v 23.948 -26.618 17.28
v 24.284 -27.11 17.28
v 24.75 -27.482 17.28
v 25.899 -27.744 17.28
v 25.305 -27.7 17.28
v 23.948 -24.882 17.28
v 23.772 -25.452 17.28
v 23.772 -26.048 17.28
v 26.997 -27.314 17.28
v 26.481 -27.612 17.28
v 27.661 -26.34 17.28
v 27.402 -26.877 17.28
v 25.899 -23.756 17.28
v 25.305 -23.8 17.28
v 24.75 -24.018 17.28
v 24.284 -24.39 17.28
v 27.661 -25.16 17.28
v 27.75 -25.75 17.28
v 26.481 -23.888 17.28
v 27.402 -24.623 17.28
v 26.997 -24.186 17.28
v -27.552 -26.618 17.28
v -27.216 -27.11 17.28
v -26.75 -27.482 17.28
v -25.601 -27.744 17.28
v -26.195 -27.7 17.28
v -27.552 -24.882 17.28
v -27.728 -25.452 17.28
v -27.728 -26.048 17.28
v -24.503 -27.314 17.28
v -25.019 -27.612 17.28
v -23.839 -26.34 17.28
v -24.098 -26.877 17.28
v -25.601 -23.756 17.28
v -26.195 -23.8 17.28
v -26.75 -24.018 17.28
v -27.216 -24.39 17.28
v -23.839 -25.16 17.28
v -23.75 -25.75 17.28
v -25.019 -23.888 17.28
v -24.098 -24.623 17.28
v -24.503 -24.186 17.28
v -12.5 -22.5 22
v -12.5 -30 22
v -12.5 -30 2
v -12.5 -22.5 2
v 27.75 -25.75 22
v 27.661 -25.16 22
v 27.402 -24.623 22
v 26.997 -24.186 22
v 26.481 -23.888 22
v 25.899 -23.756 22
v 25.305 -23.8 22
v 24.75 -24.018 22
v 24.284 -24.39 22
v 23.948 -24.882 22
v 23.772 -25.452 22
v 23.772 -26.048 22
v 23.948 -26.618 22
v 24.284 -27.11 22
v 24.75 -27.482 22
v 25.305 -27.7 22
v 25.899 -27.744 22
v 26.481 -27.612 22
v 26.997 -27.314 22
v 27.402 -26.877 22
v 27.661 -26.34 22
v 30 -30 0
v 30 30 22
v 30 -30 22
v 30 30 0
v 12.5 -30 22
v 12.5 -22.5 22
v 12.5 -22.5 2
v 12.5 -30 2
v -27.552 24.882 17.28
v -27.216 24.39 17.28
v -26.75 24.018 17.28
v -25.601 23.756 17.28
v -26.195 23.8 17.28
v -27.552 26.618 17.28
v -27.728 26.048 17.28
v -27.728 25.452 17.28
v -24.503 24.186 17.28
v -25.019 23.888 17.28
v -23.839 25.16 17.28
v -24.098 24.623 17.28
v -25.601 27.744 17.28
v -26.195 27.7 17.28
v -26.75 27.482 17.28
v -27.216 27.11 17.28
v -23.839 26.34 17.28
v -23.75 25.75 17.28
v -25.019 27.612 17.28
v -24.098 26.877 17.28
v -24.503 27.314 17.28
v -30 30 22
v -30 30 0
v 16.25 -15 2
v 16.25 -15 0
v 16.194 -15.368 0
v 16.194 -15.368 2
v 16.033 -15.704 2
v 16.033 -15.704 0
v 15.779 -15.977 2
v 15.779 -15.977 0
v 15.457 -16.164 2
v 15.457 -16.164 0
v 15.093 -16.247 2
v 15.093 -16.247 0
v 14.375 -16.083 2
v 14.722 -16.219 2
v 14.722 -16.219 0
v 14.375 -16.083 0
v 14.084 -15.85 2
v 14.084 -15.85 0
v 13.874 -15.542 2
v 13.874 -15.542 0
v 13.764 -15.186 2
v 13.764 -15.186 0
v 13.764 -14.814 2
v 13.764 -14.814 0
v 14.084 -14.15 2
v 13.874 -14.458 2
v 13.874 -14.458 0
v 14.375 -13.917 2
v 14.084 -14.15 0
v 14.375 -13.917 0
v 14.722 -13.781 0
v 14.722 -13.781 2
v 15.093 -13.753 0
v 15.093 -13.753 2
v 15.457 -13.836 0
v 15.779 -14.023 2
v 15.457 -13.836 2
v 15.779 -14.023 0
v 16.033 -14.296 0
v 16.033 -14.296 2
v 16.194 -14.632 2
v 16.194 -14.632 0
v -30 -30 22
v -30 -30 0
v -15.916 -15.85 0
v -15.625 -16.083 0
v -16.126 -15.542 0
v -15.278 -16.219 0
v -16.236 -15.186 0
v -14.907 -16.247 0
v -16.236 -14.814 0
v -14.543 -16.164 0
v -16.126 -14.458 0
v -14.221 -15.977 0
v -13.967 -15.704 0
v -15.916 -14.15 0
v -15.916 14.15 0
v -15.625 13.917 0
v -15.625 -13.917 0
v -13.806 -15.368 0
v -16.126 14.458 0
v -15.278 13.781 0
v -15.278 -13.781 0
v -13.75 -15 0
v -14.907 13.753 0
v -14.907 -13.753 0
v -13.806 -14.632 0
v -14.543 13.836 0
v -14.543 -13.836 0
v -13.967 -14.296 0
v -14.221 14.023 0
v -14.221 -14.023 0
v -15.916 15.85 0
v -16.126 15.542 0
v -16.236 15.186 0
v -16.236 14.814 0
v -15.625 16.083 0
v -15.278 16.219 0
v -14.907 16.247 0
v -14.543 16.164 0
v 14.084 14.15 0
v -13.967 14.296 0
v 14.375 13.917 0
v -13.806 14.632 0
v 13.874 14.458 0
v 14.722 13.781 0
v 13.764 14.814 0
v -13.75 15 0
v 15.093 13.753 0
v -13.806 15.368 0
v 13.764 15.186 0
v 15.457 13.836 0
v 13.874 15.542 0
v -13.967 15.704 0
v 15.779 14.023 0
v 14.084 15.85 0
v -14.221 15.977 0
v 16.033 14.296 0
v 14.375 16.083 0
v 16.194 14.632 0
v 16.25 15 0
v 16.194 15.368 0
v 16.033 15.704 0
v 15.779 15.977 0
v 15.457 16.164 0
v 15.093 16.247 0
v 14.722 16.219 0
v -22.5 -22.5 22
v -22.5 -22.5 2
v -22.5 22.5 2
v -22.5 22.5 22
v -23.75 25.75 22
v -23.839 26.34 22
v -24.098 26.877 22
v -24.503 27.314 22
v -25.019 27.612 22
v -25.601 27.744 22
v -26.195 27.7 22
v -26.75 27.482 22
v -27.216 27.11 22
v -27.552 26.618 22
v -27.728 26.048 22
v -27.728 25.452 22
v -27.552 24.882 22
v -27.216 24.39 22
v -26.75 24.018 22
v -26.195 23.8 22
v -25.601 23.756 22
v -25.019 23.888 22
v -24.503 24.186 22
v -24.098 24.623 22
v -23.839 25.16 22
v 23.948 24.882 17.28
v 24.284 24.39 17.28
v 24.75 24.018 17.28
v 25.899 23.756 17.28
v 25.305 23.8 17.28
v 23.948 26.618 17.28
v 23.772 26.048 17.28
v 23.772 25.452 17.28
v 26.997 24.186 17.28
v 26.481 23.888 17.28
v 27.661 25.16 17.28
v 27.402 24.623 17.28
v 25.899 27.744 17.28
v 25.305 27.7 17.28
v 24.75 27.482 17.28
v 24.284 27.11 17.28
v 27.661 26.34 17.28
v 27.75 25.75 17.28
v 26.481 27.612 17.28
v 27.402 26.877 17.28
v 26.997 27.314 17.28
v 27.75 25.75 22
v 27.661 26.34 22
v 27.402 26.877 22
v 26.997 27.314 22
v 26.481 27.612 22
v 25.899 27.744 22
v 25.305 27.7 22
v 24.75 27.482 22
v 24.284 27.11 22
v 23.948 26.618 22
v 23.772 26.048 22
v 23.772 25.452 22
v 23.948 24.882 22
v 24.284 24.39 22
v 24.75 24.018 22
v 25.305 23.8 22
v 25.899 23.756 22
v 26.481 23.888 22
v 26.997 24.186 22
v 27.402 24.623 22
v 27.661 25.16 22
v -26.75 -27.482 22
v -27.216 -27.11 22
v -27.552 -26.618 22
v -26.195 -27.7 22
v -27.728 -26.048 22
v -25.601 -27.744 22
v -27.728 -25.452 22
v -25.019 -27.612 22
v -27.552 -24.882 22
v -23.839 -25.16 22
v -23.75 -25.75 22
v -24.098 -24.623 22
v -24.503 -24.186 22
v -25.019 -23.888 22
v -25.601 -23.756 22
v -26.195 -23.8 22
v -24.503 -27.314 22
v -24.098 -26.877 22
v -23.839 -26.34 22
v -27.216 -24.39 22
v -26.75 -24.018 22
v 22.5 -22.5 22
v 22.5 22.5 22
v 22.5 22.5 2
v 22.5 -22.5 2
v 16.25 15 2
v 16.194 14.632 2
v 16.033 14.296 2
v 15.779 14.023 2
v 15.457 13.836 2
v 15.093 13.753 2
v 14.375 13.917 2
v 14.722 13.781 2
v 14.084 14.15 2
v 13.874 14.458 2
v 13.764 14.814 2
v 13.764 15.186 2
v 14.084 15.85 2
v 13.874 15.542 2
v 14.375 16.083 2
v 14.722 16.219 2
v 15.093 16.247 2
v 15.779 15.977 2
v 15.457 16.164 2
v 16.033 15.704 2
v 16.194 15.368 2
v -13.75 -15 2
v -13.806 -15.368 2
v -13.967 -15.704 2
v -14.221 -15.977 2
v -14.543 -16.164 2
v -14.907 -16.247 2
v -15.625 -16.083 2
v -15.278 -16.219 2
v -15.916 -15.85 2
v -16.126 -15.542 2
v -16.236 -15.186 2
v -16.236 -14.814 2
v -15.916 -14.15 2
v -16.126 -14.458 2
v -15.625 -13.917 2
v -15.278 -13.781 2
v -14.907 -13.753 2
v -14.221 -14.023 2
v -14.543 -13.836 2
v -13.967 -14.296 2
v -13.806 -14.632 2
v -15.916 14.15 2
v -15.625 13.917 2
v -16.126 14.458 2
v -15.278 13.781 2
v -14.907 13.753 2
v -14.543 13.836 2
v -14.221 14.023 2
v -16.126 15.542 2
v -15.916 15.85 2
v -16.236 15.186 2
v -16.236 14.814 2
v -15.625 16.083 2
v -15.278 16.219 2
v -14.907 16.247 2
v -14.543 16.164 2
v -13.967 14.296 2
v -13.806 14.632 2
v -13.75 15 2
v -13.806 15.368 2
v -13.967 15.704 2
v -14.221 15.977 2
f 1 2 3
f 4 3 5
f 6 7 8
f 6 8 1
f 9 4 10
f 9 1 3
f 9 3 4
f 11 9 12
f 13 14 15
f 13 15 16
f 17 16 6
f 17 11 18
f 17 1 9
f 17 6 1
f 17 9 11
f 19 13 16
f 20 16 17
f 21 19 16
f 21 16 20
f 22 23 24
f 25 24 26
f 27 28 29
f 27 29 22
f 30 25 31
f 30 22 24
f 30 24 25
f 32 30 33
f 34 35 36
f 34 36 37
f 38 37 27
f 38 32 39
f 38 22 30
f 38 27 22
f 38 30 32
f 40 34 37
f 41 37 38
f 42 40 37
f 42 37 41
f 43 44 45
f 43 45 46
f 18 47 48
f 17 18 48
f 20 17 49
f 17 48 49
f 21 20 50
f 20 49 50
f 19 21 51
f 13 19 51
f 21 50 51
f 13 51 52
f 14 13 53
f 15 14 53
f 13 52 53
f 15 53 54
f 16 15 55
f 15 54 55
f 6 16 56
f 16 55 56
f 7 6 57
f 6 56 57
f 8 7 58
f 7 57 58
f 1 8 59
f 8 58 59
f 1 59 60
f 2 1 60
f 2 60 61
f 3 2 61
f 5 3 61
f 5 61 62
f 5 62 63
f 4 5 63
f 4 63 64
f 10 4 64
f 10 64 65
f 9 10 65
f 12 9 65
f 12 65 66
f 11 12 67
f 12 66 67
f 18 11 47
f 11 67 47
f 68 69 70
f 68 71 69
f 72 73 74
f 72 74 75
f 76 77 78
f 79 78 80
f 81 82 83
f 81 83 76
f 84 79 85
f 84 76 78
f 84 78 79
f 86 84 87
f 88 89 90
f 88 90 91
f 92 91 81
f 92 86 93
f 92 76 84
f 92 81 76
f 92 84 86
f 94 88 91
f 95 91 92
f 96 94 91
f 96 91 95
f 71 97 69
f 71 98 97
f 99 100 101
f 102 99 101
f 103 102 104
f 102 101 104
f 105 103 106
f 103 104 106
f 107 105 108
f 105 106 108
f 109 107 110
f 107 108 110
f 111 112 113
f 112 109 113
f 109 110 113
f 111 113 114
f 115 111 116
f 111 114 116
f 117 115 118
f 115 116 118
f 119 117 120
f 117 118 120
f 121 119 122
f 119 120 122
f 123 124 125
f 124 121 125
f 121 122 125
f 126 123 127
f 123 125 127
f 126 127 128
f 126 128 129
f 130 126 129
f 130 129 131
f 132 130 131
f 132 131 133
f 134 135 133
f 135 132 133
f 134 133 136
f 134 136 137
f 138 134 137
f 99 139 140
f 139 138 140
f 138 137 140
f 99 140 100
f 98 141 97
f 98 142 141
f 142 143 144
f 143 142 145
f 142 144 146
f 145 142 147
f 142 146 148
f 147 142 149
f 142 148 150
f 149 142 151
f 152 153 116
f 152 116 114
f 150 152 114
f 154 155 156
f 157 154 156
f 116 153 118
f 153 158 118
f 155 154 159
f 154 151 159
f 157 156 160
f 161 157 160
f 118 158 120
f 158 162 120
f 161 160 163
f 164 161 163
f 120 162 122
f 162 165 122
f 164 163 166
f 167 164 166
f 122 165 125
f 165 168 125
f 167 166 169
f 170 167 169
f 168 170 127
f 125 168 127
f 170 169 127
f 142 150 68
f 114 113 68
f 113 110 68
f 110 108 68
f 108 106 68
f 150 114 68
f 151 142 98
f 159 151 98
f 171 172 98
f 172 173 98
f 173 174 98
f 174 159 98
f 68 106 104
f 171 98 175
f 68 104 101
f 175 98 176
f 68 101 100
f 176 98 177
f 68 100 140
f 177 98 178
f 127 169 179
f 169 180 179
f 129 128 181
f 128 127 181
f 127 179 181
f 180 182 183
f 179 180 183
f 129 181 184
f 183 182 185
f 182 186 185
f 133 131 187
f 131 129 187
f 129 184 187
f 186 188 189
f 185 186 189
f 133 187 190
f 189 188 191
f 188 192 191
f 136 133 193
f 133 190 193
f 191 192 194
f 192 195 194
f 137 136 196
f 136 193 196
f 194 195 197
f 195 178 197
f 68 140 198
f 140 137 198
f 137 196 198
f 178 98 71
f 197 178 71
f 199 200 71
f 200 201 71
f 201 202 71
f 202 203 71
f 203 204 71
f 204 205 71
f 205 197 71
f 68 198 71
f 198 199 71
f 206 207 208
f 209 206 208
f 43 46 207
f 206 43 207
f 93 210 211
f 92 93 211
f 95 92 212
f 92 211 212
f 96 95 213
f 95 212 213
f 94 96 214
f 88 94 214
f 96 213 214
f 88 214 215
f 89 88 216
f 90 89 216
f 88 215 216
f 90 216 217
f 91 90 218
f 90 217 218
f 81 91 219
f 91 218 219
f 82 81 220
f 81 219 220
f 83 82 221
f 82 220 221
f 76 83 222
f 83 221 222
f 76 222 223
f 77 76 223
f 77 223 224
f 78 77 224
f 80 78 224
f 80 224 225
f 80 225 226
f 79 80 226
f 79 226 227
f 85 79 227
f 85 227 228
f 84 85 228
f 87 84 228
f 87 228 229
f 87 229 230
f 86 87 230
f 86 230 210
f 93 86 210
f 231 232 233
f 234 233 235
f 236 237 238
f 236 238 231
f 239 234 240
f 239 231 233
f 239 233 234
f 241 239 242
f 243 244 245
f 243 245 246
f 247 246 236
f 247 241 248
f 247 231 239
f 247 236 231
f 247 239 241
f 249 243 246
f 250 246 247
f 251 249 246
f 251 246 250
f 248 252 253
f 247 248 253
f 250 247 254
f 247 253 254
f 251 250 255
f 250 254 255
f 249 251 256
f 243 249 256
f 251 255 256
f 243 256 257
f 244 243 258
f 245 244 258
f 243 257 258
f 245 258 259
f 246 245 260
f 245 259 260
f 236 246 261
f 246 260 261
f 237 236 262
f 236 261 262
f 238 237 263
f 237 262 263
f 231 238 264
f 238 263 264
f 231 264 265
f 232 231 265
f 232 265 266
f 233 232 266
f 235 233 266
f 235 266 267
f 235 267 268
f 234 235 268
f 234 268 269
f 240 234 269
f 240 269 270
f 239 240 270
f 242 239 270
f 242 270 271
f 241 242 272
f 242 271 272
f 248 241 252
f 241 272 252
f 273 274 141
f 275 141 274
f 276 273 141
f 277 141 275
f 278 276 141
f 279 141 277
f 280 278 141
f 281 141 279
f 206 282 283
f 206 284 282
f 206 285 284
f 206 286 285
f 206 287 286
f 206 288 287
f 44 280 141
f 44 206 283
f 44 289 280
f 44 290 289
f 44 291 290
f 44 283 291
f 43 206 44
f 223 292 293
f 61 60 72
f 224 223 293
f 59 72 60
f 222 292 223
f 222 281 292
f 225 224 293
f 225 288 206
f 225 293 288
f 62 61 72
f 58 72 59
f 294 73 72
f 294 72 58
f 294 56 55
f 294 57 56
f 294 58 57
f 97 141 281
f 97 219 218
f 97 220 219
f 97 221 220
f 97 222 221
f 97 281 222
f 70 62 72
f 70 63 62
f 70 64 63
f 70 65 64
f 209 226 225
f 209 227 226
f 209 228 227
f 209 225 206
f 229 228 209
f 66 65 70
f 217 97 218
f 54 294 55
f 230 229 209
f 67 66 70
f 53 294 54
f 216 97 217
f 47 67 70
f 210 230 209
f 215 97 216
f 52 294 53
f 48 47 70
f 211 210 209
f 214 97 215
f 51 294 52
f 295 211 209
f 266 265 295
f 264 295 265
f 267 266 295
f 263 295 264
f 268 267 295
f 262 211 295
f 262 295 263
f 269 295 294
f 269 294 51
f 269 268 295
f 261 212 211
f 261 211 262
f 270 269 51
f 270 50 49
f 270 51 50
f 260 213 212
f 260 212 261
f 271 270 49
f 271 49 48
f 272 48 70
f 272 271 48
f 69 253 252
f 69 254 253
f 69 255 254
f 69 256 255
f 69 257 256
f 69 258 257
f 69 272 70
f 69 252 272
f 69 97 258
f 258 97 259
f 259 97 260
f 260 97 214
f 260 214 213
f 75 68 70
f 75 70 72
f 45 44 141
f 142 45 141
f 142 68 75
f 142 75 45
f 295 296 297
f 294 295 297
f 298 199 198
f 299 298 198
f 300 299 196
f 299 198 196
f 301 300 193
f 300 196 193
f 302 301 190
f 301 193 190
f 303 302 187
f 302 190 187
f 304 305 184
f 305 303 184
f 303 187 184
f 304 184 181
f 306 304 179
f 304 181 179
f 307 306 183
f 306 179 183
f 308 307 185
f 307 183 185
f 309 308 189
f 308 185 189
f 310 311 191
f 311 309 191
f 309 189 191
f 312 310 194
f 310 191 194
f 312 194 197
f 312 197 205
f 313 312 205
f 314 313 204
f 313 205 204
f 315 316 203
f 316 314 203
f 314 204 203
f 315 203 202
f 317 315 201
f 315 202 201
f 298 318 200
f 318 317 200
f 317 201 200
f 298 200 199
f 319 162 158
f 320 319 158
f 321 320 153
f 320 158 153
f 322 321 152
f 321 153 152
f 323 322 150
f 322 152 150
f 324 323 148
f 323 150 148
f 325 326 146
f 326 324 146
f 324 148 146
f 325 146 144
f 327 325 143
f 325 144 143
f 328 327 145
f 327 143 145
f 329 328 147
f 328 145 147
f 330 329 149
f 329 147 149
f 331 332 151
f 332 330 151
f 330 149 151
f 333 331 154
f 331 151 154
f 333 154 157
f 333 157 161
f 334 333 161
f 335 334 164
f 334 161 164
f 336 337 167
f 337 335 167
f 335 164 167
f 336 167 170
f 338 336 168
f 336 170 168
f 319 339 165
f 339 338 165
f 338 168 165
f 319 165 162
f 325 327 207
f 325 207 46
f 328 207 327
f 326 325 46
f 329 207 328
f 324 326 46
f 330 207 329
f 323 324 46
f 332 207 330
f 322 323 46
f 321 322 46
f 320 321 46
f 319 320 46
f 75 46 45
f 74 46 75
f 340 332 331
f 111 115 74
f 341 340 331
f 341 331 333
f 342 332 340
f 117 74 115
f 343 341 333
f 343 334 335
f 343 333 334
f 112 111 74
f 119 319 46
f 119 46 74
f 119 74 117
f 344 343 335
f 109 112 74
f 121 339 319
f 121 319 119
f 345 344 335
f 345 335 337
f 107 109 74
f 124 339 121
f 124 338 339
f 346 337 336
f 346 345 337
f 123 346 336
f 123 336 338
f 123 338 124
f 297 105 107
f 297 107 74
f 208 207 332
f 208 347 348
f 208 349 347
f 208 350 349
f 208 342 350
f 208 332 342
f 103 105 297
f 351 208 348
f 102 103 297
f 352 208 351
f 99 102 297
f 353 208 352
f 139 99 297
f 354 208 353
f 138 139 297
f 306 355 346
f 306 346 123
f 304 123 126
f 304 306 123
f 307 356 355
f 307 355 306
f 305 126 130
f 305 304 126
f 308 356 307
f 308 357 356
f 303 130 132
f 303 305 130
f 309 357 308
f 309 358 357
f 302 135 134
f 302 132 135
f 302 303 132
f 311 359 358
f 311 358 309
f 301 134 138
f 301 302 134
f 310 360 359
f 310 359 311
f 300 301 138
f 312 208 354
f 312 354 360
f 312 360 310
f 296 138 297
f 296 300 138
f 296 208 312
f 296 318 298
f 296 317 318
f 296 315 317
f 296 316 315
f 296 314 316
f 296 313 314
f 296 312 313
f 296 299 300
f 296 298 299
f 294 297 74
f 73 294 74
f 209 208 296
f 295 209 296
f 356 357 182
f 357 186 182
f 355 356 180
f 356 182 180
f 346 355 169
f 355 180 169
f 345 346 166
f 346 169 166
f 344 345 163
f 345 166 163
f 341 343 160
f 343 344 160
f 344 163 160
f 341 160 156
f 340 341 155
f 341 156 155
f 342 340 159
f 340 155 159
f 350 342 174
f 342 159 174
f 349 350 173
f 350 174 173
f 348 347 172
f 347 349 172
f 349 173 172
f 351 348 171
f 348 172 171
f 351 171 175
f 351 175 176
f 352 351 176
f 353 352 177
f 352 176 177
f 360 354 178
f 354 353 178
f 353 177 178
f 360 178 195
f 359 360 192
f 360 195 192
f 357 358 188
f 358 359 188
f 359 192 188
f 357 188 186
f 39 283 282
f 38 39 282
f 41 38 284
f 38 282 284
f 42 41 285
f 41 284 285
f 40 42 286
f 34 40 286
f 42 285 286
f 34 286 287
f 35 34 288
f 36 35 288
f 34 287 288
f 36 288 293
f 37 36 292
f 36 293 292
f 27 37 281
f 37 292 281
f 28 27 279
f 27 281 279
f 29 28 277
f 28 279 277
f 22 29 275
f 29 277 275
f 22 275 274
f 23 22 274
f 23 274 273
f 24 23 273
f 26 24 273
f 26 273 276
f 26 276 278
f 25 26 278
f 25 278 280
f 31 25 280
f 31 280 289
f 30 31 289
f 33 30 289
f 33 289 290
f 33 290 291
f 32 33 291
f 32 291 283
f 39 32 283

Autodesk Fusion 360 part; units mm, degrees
sketch "Sketch1" plane through (0, 0, 0) normal (0, 0, 1) x (1, 0, 0)
  line L0 (-22.5, 22.5) -> (22.5, 22.5)
  line L1 (22.5, 22.5) -> (22.5, -22.5)
  line L2 (22.5, -22.5) -> (-22.5, -22.5)
  line L3 (-22.5, -22.5) -> (-22.5, 22.5)
  line L4 (-22.5, 22.5) -> (22.5, -22.5) construction
  line L5 (22.5, 22.5) -> (-22.5, -22.5) construction
  circle A0 centre (-15, 15) radius 1.25
  circle A1 centre (15, 15) radius 1.25
  circle A2 centre (15, -15) radius 1.25
  circle A3 centre (-15, -15) radius 1.25
  line L6 (-30, 30) -> (30, 30)
  line L7 (30, 30) -> (30, -30)
  line L8 (30, -30) -> (-30, -30)
  line L9 (-30, -30) -> (-30, 30)
  line L10 (-30, 30) -> (30, -30) construction
  line L11 (30, 30) -> (-30, -30) construction
  line L12 (-12.5, -22.5) -> (12.5, -22.5)
  line L13 (12.5, -22.5) -> (12.5, -30)
  line L14 (12.5, -30) -> (-12.5, -30)
  line L15 (-12.5, -30) -> (-12.5, -22.5)
  dimension "d1" = 45
  dimension "d2" = 45
  dimension "d3" = 2.5
  dimension "d4" = 2.5
  dimension "d5" = 2.5
  dimension "d6" = 2.5
  dimension "d7" = 7.5
  dimension "d9" = 7.5
  dimension "d10" = 7.5
  dimension "d11" = 7.5
  dimension "d12" = 60
  dimension "d13" = 60
  dimension "d14" = 7.5
  dimension "d15" = 10
  dimension "d16" = 10
extrude "Extrude1" add sketch "Sketch1" along normal blind 22 contours L0 L1 L2 L3 L6 L7 L8 L9 L13 L15
extrude "Extrude2" add sketch "Sketch1" along normal blind 2 contours L0 L1 L2 L3 L12
extrude "Extrude3" add sketch "Sketch1" along normal blind 2 contours L2 L8 L12 L13 L14 L15
sketch "Sketch2" plane through (0, 0, 22) normal (0, 0, 1) x (1, 0, 0)
  line L0 (-30, -30) -> (-12.5, -30)
  line L1 (-12.5, -30) -> (-12.5, -22.5)
  line L2 (-12.5, -22.5) -> (-22.5, -22.5)
  line L3 (-22.5, -22.5) -> (-22.5, 22.5)
  line L4 (-22.5, 22.5) -> (22.5, 22.5)
  line L5 (22.5, 22.5) -> (22.5, -22.5)
  line L6 (22.5, -22.5) -> (12.5, -22.5)
  line L7 (12.5, -22.5) -> (12.5, -30)
  line L8 (12.5, -30) -> (30, -30)
  line L9 (30, -30) -> (30, 30)
  line L10 (30, 30) -> (-30, 30)
  line L11 (-30, 30) -> (-30, -30)
  circle A0 centre (-25.75, 25.75) radius 2
  circle A1 centre (25.75, 25.75) radius 2
  circle A2 centre (-25.75, -25.75) radius 2
  circle A3 centre (25.75, -25.75) radius 2
  dimension "d23" = 4
  dimension "d24" = 4.25
  dimension "d25" = 4.25
  dimension "d26" = 4
  dimension "d27" = 4.25
  dimension "d28" = 4.25
  dimension "d29" = 4
  dimension "d30" = 4.25
  dimension "d31" = 4.25
  dimension "d32" = 4
  dimension "d33" = 4.25
  dimension "d34" = 4.25
extrude "Extrude4" cut sketch "Sketch2" against normal blind 4.72 contours A0 | A1 | A2 | A3
equation "d24 = holesfromcorner"
equation "d25 = holesfromcorner"
equation "d27 = holesfromcorner"
equation "d28 = holesfromcorner"
equation "d30 = holesfromcorner"
equation "d31 = holesfromcorner"
equation "d33 = holesfromcorner"
equation "d34 = holesfromcorner"
equation "holesfromcorner = 4.25 mm"
